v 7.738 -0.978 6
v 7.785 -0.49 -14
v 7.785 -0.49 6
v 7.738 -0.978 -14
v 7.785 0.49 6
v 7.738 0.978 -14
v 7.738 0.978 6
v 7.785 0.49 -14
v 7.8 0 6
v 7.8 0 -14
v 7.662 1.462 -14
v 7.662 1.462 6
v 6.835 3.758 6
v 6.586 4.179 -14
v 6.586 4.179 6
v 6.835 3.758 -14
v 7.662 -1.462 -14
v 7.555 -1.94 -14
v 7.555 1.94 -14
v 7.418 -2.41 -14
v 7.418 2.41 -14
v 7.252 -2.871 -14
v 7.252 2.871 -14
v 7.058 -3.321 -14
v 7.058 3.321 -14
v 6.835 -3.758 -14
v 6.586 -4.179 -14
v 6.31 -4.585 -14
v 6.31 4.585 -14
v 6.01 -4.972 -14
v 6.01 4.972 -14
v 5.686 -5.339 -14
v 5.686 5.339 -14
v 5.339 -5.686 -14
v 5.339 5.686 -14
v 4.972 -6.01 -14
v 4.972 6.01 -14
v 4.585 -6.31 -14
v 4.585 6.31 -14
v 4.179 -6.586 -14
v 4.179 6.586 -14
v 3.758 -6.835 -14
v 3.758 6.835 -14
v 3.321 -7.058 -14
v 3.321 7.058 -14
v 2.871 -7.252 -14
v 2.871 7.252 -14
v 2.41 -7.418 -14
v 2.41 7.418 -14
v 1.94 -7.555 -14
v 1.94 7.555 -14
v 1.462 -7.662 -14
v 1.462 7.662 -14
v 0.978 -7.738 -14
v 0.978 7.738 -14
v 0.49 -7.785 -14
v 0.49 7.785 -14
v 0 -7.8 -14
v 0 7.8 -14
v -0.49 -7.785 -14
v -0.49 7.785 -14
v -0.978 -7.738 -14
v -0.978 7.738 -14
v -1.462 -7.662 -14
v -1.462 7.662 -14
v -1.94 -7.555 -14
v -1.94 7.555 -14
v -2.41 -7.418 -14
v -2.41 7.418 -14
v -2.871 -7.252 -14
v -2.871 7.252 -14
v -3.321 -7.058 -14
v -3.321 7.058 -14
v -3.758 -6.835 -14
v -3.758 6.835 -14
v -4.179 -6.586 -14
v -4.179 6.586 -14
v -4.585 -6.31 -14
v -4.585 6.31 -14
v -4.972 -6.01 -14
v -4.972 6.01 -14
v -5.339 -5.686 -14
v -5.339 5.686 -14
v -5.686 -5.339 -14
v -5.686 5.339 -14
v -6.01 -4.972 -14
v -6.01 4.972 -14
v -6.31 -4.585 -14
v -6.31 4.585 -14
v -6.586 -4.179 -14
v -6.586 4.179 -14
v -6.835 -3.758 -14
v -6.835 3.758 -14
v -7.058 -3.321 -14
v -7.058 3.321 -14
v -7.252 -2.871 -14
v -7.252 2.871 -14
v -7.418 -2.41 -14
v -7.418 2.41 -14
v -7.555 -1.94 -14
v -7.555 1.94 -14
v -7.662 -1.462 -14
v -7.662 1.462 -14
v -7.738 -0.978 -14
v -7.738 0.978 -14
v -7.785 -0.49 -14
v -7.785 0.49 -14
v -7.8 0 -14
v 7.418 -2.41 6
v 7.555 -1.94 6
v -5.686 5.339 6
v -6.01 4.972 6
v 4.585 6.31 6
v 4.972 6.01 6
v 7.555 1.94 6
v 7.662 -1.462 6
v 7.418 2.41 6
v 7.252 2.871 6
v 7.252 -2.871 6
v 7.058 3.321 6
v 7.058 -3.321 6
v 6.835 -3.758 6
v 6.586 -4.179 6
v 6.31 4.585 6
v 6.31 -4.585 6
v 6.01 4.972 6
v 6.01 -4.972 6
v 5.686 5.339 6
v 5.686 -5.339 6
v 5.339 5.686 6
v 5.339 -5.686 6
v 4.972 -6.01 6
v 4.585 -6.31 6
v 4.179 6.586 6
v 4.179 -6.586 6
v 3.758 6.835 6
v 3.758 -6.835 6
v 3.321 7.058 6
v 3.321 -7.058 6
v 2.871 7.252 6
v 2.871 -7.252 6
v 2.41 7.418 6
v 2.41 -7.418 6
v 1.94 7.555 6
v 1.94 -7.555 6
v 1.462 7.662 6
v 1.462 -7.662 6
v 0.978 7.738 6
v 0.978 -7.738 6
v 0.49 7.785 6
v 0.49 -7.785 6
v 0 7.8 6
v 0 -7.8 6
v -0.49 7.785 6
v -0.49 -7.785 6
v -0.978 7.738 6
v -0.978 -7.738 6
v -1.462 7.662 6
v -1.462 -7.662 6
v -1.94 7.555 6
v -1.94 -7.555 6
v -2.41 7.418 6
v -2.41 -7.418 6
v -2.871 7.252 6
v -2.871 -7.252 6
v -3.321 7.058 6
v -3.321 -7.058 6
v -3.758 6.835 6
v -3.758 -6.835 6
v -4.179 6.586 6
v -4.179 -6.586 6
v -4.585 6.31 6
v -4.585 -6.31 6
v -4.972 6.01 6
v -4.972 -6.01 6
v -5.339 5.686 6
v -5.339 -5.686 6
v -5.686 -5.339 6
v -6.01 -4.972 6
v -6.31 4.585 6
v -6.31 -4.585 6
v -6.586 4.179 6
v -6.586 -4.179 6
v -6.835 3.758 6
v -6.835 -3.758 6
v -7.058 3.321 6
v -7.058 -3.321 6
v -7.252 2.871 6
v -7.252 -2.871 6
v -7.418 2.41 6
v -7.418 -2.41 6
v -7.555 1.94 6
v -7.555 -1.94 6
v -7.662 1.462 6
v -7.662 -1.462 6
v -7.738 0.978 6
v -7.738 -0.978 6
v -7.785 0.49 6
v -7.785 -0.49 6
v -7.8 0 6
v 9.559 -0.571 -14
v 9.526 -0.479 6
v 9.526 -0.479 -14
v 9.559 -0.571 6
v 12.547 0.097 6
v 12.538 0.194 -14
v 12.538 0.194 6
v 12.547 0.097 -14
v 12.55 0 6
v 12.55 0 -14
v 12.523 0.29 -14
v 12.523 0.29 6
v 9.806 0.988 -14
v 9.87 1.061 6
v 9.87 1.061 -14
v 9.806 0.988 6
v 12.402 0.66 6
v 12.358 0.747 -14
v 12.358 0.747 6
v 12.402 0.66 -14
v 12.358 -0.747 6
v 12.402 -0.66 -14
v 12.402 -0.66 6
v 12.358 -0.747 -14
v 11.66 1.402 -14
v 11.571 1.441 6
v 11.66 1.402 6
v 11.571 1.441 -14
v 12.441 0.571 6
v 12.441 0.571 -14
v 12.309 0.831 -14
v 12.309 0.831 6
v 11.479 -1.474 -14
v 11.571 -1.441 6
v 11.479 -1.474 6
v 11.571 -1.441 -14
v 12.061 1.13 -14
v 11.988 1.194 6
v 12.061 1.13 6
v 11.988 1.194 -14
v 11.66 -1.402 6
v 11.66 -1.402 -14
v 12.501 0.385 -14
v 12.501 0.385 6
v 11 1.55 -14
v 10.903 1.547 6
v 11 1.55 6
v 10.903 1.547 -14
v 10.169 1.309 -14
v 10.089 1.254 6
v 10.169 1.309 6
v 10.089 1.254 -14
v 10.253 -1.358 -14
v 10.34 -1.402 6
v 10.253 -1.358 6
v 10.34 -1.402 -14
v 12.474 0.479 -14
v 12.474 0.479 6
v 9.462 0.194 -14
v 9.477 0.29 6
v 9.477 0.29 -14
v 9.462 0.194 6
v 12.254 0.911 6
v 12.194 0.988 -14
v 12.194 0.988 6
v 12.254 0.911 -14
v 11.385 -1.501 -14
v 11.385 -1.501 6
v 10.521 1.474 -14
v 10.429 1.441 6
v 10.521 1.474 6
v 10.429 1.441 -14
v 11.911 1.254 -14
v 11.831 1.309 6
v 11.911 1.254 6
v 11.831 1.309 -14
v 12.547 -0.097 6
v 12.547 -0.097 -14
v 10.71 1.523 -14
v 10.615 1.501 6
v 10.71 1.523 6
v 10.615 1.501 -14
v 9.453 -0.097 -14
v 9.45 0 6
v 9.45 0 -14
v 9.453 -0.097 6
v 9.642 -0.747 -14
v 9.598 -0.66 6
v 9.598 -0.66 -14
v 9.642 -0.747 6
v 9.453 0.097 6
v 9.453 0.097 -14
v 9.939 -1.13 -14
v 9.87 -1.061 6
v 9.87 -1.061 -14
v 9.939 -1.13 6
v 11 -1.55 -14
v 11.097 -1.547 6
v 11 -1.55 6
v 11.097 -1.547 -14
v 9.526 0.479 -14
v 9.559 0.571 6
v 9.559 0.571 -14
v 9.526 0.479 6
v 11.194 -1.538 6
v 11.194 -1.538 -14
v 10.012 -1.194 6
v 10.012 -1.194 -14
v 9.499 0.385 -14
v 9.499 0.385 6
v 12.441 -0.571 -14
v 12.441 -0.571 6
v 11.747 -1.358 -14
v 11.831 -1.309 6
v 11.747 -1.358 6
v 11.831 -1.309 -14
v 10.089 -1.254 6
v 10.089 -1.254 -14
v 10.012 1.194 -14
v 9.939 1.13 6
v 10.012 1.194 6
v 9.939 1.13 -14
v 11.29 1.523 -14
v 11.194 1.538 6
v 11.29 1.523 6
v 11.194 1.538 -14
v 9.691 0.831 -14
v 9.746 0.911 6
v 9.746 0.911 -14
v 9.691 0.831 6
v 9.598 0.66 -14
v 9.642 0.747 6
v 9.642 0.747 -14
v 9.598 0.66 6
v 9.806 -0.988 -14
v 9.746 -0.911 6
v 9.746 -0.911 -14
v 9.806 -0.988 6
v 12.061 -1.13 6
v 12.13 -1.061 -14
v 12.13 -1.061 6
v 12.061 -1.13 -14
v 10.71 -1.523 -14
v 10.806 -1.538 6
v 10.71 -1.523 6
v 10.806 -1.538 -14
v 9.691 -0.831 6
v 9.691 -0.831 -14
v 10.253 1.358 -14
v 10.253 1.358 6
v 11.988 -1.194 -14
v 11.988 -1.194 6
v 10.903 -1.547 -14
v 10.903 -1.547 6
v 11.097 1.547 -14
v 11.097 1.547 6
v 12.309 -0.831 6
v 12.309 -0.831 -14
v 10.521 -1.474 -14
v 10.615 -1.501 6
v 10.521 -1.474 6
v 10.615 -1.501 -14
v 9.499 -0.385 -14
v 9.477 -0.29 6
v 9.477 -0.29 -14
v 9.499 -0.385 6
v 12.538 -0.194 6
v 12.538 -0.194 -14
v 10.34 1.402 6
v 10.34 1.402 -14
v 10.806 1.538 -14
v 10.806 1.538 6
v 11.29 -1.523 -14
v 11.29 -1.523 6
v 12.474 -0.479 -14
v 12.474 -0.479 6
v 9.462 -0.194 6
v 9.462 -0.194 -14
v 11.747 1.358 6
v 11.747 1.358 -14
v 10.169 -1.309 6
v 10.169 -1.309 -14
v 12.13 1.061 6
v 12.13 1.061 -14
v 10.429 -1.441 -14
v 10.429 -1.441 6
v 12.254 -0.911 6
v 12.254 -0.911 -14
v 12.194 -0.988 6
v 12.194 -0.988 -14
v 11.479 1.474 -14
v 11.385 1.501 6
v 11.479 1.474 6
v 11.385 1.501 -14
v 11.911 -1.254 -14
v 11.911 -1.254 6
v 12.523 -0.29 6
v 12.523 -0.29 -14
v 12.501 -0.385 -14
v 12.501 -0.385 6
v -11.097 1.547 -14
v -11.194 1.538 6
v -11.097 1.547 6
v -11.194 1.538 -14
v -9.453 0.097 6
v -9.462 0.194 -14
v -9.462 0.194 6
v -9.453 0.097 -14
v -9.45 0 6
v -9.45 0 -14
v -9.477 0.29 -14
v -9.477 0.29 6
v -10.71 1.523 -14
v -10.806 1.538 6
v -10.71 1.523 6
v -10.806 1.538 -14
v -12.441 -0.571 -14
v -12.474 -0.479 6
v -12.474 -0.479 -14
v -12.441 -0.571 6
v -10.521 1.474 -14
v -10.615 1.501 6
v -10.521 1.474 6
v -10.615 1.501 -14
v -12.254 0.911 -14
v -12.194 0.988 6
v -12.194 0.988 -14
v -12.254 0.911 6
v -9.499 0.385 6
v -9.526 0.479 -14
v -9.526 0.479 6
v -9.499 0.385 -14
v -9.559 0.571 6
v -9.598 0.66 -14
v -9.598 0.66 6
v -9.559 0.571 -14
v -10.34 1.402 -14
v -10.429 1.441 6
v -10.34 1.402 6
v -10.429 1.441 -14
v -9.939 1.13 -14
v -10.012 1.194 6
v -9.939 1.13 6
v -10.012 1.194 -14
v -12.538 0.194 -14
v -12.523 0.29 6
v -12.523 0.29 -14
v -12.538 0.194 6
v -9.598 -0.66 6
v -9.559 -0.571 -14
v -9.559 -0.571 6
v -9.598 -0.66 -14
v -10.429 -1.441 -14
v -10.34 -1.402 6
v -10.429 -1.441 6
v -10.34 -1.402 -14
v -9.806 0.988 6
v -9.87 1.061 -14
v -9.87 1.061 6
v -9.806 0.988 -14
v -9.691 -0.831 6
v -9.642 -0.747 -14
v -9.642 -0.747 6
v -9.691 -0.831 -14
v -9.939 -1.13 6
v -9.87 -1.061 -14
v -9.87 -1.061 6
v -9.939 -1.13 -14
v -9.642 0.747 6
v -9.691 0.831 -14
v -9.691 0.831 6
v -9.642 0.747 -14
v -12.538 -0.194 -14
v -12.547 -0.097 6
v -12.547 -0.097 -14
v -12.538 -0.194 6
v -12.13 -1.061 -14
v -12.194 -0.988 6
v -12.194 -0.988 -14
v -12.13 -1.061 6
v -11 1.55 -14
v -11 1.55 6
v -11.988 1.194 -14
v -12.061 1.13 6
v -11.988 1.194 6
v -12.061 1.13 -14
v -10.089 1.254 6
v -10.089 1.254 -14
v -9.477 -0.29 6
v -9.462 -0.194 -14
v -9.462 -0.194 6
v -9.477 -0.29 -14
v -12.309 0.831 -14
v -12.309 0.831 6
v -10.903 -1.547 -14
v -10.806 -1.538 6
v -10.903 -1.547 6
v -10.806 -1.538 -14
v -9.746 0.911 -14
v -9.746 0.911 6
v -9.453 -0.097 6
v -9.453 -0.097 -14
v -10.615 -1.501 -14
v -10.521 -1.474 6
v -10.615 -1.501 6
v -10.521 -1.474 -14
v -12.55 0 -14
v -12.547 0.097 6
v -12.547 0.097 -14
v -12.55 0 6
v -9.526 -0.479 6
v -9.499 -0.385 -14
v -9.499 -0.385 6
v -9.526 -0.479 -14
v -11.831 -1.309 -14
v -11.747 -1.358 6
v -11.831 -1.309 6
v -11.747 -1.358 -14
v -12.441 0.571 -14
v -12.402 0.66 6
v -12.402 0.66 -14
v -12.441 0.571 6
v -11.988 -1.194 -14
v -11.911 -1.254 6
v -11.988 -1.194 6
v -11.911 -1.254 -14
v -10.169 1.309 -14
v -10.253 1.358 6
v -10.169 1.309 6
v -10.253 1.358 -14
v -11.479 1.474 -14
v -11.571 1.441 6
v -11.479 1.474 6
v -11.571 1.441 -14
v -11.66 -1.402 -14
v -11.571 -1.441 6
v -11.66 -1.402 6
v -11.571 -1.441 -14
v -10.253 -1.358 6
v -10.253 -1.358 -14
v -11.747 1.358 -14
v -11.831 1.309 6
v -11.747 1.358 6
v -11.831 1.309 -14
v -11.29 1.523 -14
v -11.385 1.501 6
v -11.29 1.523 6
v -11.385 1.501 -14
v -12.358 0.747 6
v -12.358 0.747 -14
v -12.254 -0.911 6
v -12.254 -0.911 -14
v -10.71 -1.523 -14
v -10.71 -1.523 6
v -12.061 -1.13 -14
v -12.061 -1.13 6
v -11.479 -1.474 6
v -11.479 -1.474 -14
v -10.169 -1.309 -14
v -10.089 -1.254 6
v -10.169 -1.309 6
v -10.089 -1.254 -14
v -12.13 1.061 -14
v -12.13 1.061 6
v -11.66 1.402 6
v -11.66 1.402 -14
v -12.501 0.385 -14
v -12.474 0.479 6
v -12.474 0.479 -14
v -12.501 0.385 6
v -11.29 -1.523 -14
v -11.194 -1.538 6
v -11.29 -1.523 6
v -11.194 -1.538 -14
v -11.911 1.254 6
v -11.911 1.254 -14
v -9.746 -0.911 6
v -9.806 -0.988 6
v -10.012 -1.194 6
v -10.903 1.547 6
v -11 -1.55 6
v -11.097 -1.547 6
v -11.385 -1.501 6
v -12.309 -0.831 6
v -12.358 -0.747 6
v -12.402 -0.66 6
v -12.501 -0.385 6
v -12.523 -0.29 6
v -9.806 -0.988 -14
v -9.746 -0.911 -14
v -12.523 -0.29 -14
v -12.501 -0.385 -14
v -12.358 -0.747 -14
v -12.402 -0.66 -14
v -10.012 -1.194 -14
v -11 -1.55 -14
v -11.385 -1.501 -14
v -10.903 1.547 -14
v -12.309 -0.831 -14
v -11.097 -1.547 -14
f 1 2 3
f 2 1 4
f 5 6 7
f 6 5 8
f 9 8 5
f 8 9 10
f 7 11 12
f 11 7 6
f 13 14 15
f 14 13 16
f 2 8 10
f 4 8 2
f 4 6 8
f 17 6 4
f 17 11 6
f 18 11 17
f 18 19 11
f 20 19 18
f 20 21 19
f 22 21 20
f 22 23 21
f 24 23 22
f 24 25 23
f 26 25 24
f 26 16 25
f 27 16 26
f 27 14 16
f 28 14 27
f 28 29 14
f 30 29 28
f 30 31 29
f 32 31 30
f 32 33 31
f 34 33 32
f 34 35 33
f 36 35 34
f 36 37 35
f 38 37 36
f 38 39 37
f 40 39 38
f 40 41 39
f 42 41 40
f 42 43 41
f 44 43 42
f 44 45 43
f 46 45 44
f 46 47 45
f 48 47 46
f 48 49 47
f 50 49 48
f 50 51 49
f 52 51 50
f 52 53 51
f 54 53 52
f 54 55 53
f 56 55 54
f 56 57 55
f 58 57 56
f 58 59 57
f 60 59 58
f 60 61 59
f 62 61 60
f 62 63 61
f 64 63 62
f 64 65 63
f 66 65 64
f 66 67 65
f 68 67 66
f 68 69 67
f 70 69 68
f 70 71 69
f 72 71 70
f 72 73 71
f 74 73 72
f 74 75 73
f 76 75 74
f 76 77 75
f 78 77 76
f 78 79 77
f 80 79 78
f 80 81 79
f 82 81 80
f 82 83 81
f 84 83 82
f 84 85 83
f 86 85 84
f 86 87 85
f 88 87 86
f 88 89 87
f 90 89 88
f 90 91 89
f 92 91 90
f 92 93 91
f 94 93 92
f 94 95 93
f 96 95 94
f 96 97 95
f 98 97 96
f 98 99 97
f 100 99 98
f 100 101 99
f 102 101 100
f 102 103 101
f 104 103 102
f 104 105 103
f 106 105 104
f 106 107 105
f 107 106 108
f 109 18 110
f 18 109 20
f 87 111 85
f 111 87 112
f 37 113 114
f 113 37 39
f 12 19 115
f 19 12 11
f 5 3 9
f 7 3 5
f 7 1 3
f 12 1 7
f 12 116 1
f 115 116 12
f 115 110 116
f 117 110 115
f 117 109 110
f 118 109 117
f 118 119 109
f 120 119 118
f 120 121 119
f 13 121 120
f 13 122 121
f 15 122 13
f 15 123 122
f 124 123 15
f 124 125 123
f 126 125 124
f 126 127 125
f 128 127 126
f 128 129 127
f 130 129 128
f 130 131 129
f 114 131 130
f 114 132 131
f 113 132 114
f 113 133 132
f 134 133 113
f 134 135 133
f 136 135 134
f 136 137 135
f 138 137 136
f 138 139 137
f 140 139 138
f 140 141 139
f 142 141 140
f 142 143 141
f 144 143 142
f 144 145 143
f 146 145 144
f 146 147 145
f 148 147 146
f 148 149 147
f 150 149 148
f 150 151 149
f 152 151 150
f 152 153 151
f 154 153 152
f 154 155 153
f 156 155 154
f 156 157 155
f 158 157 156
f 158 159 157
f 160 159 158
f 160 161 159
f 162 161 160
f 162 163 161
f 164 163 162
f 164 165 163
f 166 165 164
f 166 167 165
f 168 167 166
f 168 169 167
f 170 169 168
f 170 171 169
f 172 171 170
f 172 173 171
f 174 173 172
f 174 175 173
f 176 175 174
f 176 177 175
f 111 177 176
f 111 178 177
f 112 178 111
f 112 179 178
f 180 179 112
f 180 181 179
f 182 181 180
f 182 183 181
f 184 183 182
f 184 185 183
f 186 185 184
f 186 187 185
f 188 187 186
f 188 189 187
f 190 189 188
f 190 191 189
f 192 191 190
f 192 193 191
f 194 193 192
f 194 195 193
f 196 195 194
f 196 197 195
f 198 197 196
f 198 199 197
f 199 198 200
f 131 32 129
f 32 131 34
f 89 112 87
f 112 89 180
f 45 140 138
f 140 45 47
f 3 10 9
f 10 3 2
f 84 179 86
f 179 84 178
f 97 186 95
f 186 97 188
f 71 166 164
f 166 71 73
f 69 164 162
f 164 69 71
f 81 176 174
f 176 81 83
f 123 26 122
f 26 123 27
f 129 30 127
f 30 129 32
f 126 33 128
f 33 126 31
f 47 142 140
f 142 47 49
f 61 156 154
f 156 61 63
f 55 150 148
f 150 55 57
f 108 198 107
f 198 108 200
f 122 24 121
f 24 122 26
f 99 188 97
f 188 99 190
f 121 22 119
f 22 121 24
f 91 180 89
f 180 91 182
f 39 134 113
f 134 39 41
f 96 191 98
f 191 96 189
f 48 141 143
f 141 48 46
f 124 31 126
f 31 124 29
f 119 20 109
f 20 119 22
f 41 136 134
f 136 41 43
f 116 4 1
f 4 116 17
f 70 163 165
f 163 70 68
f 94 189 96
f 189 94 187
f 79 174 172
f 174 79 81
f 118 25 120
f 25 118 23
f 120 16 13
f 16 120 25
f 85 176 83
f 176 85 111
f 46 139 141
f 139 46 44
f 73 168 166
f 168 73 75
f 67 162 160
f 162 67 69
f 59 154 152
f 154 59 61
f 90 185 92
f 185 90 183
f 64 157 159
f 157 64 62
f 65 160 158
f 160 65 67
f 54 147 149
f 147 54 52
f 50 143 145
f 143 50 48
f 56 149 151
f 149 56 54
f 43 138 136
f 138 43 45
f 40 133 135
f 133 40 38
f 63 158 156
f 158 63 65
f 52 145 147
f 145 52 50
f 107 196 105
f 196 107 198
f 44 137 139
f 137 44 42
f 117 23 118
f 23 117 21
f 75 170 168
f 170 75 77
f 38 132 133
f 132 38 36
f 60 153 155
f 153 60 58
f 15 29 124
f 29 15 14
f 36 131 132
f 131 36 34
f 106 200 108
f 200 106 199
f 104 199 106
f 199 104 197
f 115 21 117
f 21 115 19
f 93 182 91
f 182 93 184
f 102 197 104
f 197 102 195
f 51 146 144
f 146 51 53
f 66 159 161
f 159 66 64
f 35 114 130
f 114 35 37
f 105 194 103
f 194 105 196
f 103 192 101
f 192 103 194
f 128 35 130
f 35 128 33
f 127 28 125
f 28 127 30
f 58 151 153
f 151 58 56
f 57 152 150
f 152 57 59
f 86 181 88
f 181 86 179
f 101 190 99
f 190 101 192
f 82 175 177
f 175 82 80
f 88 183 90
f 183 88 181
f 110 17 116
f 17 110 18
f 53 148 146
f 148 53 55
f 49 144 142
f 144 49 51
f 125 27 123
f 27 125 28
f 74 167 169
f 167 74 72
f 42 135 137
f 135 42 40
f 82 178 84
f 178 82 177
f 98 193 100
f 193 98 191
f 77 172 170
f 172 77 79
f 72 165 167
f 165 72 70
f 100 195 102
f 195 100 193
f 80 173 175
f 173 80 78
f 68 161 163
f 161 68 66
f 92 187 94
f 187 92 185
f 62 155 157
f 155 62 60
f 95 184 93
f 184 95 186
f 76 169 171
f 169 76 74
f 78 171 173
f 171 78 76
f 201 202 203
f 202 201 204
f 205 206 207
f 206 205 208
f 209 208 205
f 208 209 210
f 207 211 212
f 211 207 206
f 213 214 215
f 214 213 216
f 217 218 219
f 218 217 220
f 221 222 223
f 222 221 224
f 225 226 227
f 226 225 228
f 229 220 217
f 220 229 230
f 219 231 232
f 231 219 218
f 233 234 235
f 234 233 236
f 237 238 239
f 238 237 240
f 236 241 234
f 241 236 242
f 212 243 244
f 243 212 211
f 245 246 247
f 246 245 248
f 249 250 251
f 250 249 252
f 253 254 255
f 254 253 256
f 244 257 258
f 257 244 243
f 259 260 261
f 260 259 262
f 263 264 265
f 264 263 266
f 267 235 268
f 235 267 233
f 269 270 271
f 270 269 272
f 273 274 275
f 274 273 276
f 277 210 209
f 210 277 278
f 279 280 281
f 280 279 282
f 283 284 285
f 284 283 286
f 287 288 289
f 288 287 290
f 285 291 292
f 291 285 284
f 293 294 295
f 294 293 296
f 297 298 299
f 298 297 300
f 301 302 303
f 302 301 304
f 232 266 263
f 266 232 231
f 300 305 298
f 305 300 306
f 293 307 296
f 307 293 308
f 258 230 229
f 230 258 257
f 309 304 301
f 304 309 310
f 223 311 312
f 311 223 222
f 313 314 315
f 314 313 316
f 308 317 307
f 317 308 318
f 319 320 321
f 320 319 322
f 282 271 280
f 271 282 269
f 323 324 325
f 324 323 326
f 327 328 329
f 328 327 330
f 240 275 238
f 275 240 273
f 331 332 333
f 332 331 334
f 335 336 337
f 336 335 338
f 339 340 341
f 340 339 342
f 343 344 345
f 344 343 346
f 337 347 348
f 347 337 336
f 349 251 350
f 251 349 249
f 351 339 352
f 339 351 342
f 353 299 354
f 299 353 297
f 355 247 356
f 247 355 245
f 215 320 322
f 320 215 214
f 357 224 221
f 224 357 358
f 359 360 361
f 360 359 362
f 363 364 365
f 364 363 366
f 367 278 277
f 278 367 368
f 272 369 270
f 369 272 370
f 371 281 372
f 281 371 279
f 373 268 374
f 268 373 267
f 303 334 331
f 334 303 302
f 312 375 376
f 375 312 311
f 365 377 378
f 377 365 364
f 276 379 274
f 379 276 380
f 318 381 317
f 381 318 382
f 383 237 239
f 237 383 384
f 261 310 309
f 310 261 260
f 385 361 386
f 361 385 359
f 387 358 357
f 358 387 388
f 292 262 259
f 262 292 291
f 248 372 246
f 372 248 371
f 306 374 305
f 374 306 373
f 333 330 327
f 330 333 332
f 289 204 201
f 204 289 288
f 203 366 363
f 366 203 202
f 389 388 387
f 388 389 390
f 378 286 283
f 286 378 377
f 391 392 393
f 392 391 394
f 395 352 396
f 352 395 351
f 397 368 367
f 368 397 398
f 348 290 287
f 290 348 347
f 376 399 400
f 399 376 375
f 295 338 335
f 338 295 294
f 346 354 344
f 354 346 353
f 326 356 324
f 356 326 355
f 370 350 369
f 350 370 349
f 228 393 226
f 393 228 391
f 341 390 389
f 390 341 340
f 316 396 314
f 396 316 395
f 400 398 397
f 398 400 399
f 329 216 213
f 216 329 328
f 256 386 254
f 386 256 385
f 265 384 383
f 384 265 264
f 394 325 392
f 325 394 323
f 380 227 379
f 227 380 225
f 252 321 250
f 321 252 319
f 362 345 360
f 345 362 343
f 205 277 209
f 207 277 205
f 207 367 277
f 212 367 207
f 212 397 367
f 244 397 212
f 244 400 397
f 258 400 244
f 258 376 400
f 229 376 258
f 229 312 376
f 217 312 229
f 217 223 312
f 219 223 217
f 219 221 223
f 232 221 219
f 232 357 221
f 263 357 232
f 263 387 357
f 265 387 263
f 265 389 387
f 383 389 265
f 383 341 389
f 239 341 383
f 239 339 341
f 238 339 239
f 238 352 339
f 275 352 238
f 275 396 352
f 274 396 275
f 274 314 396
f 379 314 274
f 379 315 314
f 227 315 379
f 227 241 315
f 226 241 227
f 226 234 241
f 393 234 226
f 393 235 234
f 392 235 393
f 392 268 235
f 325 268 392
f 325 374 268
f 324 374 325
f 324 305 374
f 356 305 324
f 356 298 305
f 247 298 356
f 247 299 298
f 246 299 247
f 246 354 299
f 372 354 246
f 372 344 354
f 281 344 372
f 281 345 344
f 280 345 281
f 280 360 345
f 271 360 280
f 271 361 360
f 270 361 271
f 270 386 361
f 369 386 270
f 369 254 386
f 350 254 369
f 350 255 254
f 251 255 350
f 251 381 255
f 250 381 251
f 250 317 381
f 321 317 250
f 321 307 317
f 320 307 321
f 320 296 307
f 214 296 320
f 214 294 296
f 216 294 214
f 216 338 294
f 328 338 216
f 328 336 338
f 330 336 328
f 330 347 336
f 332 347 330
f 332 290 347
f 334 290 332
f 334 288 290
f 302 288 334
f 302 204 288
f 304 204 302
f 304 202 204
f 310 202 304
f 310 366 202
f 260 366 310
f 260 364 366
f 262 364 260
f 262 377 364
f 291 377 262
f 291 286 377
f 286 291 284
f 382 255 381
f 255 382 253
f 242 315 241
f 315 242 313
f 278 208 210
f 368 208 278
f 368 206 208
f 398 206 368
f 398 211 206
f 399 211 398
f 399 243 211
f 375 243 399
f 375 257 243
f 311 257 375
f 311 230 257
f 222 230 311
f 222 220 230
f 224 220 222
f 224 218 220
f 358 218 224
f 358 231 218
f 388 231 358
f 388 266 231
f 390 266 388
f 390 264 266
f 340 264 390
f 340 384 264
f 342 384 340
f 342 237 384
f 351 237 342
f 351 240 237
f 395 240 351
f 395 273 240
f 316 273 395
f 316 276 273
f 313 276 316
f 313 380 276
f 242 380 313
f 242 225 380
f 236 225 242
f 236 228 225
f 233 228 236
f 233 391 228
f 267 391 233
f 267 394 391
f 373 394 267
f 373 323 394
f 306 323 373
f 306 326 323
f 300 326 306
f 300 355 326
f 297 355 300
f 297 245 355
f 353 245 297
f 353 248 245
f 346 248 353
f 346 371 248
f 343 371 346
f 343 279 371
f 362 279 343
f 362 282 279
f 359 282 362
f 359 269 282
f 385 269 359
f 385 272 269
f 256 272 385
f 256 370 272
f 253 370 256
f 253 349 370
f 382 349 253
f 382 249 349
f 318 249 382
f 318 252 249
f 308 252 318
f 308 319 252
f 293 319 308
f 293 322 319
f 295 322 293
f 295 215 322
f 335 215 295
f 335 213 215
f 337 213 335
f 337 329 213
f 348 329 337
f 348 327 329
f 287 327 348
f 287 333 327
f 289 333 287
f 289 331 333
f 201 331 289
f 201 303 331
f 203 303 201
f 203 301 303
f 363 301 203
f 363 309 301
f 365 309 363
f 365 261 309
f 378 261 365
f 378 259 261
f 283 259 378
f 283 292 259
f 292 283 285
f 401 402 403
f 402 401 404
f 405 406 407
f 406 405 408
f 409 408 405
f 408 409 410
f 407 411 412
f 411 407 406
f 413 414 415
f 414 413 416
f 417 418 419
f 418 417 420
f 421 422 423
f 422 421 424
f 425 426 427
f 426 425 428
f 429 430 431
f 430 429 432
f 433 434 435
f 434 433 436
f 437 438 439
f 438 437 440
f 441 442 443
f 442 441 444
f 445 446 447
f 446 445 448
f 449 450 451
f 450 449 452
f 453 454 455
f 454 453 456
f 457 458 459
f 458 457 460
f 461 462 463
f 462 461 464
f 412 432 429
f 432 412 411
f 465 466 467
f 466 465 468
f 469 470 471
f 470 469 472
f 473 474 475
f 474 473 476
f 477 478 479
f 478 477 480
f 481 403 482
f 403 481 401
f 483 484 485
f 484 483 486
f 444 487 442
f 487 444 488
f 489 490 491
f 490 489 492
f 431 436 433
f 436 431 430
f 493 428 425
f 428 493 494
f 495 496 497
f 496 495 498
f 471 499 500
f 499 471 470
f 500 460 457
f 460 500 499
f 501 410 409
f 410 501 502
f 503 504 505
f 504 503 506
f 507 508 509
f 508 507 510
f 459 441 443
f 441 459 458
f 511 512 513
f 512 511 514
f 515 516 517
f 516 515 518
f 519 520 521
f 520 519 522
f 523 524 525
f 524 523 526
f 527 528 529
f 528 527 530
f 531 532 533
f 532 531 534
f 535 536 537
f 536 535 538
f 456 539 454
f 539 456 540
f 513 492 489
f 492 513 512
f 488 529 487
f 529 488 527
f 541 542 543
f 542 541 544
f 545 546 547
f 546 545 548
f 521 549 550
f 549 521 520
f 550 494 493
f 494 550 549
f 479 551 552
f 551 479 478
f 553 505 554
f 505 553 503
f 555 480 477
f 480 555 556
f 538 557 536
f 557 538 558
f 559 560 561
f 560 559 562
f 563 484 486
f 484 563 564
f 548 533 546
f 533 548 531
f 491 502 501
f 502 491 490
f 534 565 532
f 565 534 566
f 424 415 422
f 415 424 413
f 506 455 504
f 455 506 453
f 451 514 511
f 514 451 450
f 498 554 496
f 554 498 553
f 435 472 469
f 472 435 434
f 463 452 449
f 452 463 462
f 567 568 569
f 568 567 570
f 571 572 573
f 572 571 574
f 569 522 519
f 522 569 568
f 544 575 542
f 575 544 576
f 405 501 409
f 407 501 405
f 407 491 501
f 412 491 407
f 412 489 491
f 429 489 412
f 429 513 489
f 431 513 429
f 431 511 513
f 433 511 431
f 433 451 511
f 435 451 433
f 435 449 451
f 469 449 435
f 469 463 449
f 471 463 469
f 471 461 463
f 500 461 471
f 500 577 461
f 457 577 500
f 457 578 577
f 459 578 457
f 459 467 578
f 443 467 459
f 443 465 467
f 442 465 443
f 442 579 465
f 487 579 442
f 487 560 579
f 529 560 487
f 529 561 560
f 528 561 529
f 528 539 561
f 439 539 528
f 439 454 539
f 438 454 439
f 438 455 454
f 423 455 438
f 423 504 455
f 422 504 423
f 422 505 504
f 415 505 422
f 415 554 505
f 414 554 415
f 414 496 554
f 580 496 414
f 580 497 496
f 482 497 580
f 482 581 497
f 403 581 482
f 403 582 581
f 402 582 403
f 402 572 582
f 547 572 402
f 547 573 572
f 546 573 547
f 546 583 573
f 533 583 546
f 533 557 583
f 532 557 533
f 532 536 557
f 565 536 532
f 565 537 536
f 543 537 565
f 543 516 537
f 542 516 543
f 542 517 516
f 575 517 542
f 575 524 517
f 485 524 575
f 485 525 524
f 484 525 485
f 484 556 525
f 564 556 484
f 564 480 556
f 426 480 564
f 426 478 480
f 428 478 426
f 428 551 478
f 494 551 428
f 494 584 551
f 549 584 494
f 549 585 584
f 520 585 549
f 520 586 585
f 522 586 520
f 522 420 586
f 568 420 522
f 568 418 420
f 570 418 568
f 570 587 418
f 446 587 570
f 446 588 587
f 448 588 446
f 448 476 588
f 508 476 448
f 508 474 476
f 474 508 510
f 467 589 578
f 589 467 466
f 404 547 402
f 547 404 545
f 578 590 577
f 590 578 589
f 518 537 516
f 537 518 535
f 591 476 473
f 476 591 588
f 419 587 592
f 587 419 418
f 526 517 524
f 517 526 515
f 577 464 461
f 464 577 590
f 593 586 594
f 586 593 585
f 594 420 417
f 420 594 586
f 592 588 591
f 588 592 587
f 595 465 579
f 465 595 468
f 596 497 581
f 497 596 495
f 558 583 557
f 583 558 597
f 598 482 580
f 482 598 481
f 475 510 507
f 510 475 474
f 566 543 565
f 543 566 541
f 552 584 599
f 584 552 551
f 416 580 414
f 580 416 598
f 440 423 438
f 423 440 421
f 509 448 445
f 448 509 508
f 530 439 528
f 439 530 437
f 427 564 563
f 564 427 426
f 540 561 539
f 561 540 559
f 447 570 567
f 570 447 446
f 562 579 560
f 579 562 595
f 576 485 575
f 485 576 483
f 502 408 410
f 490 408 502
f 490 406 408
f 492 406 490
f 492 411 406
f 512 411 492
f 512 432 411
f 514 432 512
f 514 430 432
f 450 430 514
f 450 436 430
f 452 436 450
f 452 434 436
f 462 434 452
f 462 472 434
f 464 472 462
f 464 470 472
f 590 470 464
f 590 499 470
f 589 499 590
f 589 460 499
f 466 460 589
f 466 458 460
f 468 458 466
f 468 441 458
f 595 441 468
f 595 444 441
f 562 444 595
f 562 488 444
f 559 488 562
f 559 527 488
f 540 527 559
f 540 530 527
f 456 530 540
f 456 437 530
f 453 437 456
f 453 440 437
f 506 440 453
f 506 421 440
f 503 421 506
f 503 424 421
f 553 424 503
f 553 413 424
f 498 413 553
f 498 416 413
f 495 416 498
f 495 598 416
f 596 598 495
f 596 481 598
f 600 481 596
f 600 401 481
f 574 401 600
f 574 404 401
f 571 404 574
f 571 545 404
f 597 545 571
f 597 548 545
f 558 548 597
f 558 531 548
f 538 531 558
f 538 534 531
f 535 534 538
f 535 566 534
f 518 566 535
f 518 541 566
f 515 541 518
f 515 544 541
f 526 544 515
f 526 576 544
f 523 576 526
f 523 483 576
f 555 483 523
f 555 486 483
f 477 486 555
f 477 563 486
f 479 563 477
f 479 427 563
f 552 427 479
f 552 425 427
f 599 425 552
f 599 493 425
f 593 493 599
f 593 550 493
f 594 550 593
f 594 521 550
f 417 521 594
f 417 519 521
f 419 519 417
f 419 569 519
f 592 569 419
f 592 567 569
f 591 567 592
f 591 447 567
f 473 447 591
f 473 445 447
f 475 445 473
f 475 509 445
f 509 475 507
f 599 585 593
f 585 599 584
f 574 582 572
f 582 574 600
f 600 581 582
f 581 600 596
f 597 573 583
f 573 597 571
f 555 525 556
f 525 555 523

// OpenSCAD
$fn = $preview ? 20 : 100; 
tolerance = 0.3;

module midi() {
    translate([0, 0, -14])
    cylinder(r = 7.5 + tolerance, h = 20);
    
    translate([11, 0, -14])
    cylinder(r = 1.25 + tolerance, h = 20);
    
    translate([-11, 0, -14])
    cylinder(r = 1.25 + tolerance, h = 20);
}

midi();
